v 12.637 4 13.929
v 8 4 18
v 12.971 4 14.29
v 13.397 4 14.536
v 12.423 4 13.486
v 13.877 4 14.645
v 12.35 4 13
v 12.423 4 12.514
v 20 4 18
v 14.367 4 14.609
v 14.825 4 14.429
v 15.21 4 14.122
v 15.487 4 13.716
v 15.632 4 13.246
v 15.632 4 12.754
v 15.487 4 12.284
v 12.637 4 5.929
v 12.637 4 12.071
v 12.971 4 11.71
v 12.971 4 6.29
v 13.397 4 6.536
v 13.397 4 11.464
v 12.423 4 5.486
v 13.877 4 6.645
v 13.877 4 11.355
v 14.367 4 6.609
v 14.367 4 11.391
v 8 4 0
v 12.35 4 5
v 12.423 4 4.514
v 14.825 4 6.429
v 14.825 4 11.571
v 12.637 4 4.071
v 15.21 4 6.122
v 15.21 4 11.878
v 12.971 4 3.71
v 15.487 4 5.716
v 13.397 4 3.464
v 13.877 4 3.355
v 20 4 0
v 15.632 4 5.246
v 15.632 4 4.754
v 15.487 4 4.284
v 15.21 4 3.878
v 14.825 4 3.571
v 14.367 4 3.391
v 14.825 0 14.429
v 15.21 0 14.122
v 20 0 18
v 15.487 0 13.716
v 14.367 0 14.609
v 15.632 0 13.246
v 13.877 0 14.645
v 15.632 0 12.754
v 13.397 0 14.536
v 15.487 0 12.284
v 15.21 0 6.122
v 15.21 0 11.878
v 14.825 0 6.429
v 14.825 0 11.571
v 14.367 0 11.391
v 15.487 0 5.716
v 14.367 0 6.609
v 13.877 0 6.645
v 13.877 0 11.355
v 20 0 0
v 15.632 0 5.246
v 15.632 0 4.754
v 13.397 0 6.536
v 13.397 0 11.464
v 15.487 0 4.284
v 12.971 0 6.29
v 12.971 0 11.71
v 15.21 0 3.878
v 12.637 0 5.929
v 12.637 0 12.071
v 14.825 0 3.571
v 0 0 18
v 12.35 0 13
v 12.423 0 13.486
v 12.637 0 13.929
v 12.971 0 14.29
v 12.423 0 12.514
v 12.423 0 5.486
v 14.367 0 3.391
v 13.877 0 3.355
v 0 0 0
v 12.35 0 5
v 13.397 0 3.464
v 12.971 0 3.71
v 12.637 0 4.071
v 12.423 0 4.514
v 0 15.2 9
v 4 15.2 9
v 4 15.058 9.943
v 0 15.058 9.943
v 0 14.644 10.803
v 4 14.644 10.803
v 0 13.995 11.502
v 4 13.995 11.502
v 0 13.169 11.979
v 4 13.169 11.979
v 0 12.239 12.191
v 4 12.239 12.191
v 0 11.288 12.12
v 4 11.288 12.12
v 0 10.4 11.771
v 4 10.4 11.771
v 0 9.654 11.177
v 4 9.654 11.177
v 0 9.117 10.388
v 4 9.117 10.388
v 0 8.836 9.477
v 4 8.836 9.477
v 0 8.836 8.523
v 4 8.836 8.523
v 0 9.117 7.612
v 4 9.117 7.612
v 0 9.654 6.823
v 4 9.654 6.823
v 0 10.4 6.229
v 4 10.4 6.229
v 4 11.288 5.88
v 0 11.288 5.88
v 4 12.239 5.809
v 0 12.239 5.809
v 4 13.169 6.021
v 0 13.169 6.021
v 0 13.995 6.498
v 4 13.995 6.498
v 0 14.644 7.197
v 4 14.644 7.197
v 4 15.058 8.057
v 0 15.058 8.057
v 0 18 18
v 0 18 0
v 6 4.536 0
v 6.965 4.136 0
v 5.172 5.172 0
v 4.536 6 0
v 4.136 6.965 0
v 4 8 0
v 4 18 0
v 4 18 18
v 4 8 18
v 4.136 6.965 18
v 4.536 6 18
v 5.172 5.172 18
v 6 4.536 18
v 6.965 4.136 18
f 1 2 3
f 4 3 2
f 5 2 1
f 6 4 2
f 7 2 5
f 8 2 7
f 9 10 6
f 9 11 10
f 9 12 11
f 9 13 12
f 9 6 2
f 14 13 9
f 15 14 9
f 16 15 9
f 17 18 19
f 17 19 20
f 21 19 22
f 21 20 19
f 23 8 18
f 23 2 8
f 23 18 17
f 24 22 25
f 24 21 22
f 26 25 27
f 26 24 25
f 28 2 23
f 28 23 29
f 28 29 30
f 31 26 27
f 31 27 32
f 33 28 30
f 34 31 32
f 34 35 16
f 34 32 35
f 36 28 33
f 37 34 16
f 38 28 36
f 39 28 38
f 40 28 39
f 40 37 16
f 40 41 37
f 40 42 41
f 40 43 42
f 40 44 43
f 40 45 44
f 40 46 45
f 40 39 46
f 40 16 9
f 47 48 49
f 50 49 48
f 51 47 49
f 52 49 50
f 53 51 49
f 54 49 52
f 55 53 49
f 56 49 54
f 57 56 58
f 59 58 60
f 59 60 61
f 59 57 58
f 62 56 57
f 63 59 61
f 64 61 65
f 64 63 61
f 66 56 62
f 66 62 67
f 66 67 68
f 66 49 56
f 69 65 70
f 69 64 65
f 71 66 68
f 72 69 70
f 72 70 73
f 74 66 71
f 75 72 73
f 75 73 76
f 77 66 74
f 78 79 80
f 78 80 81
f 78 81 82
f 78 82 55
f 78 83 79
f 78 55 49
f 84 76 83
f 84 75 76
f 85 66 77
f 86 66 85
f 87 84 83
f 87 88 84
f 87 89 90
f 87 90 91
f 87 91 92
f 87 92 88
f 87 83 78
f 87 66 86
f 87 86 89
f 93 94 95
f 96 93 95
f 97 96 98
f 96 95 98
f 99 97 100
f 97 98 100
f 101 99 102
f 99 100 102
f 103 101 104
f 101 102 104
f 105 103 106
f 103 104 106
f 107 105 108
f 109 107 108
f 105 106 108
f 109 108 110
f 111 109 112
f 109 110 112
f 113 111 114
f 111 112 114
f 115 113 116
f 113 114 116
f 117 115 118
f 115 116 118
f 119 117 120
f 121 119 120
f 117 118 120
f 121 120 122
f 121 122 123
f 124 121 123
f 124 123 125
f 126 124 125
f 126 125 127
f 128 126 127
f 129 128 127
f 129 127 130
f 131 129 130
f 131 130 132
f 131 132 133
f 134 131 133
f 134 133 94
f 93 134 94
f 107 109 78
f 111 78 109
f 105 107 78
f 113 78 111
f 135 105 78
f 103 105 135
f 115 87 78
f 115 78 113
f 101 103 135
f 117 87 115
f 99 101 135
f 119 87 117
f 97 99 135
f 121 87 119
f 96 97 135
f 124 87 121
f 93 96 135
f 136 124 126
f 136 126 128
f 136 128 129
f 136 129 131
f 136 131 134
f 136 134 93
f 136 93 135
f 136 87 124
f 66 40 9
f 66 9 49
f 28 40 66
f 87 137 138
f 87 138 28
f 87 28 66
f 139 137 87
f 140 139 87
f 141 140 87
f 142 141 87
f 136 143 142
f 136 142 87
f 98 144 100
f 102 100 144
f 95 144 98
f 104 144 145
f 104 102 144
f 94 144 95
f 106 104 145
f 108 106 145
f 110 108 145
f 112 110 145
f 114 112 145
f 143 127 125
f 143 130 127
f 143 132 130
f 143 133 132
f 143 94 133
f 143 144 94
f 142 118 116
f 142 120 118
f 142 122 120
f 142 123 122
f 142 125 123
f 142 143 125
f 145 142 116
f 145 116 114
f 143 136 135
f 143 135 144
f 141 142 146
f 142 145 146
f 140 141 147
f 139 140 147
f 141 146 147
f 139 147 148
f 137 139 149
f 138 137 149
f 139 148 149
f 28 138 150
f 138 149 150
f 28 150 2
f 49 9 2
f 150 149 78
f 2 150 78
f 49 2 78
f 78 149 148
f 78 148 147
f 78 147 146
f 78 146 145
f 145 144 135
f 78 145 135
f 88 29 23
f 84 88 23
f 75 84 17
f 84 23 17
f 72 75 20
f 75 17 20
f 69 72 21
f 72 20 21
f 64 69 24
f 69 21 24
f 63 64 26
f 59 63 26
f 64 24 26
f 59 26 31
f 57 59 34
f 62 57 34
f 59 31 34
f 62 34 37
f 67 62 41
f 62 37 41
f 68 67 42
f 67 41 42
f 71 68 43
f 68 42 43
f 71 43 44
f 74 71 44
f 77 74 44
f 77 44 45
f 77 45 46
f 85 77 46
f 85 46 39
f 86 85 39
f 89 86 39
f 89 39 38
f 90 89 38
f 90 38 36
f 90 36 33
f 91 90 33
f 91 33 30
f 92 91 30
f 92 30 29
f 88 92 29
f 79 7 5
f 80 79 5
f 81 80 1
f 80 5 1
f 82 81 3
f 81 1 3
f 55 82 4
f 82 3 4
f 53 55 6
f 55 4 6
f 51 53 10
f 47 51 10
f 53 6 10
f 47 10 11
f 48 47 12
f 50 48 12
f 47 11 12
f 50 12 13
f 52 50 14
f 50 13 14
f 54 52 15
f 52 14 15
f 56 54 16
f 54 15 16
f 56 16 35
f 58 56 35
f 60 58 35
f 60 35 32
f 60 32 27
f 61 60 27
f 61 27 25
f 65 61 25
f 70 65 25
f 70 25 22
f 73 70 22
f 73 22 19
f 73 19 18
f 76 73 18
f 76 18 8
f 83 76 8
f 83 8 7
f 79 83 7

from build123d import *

# Parameters (mm, degrees)
BOSS_EXTRUDE1_DEPTH = 18
SKETCH2_R           = 3.2
CUT_EXTRUDE1_DEPTH  = 25
FILLET1_R           = 4
SKETCH3_R           = 1.65
CUT_EXTRUDE2_DEPTH  = 25


with BuildPart() as part:
    # Sketch1 → Boss-Extrude1 (new body)
    with BuildSketch(Plane.XY):
        Polygon((0, 0), (0, 18), (4, 18), (4, 4), (20, 4), (20, 0), align=None)
    extrude(amount=BOSS_EXTRUDE1_DEPTH)

    # Sketch2 → Cut-Extrude1 (cut)
    with BuildSketch(Plane(origin=(4, 0, 0), x_dir=(0, 0, -1), z_dir=(1, 0, 0))):
        with Locations(Location((-9, 12, 0), (0, 0, 90))):
            Circle(SKETCH2_R)
    extrude(amount=-CUT_EXTRUDE1_DEPTH, mode=Mode.SUBTRACT)

    # Fillet1
    fillet1_edges = [part.edges().sort_by_distance(p)[0] for p in [
        (4, 4, 9),
    ]]
    fillet(fillet1_edges, radius=FILLET1_R)

    # Sketch3 → Cut-Extrude2 (cut)
    with BuildSketch(Plane(origin=(0, 4, 0), x_dir=(1, 0, 0), z_dir=(0, 1, 0))):
        with Locations(Location((14, -5, 0), (0, 0, 180))):
            Circle(SKETCH3_R)
        with Locations(Location((14, -13, 0), (0, 0, 180))):
            Circle(SKETCH3_R)
    extrude(amount=-CUT_EXTRUDE2_DEPTH, mode=Mode.SUBTRACT)


solid = part.part
